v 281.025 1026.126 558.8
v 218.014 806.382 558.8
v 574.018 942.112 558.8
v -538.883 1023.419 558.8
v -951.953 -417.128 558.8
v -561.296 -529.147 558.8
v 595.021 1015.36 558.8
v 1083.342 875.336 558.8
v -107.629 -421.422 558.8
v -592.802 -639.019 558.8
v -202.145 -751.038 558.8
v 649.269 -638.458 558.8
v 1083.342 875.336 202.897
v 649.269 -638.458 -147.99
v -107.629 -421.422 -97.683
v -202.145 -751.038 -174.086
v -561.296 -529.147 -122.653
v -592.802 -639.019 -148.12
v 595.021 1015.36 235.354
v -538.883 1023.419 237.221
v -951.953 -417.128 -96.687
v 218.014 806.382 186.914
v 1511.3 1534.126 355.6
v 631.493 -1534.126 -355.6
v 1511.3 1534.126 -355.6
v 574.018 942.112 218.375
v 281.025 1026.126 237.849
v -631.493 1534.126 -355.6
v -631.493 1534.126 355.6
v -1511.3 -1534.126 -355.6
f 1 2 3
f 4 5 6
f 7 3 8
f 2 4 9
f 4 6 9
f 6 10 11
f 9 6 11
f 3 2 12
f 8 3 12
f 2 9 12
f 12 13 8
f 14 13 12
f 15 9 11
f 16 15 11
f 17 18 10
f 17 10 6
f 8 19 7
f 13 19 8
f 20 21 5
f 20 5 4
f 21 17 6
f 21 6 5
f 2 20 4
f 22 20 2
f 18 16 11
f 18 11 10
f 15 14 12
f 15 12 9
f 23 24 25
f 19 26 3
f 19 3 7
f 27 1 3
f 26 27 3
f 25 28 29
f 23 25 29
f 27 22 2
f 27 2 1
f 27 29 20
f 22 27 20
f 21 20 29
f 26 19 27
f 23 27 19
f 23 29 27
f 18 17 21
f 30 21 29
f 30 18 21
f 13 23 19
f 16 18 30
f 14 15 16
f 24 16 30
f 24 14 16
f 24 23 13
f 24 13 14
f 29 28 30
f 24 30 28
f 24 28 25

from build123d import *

# Parameters (mm, degrees)
F1_DEPTH = 1511.3
F3_DEPTH = 711.201
F5_DEPTH = 914.4


with BuildPart() as f1:
    # F0 (on Right) → F1 (new body, symmetric)
    with BuildSketch(Plane.YZ):
        Polygon((1534.126357, 355.6), (0, 0), (-1534.126357, -355.6), (1534.126357, -355.6), align=None)
    extrude(amount=F1_DEPTH, both=True)

    # F2 (on face) → F3 (cut, through all)
    with BuildSketch(Plane(origin=(0, 0, -355.6), x_dir=(1, 0, 0), z_dir=(0, 0, -1))):
        Polygon((631.492692, 1534.126357), (1511.3, -1534.126357), (1511.3, 1534.126357), align=None)
        Polygon((-631.492692, -1534.126357), (-1511.3, 1534.126357), (-1511.3, -1534.126357), align=None)
    extrude(amount=-F3_DEPTH, mode=Mode.SUBTRACT)

    # F4 (on face) → F5 (join)
    with BuildSketch(Plane(origin=(0, 0, -355.6), x_dir=(1, 0, 0), z_dir=(0, 0, -1))):
        Polygon((-951.953105, 417.12799), (-538.882964, -1023.418788), (218.014496, -806.381934), (281.025195, -1026.126357), (574.01776, -942.112091), (595.021327, -1015.360232), (1083.342268, -875.336456), (649.26856, 638.458463), (-107.628899, 421.421609), (-202.144948, 751.038245), (-592.801702, 639.019223), (-561.296352, 529.147011), align=None)
    extrude(amount=-F5_DEPTH)


solid = f1.part
